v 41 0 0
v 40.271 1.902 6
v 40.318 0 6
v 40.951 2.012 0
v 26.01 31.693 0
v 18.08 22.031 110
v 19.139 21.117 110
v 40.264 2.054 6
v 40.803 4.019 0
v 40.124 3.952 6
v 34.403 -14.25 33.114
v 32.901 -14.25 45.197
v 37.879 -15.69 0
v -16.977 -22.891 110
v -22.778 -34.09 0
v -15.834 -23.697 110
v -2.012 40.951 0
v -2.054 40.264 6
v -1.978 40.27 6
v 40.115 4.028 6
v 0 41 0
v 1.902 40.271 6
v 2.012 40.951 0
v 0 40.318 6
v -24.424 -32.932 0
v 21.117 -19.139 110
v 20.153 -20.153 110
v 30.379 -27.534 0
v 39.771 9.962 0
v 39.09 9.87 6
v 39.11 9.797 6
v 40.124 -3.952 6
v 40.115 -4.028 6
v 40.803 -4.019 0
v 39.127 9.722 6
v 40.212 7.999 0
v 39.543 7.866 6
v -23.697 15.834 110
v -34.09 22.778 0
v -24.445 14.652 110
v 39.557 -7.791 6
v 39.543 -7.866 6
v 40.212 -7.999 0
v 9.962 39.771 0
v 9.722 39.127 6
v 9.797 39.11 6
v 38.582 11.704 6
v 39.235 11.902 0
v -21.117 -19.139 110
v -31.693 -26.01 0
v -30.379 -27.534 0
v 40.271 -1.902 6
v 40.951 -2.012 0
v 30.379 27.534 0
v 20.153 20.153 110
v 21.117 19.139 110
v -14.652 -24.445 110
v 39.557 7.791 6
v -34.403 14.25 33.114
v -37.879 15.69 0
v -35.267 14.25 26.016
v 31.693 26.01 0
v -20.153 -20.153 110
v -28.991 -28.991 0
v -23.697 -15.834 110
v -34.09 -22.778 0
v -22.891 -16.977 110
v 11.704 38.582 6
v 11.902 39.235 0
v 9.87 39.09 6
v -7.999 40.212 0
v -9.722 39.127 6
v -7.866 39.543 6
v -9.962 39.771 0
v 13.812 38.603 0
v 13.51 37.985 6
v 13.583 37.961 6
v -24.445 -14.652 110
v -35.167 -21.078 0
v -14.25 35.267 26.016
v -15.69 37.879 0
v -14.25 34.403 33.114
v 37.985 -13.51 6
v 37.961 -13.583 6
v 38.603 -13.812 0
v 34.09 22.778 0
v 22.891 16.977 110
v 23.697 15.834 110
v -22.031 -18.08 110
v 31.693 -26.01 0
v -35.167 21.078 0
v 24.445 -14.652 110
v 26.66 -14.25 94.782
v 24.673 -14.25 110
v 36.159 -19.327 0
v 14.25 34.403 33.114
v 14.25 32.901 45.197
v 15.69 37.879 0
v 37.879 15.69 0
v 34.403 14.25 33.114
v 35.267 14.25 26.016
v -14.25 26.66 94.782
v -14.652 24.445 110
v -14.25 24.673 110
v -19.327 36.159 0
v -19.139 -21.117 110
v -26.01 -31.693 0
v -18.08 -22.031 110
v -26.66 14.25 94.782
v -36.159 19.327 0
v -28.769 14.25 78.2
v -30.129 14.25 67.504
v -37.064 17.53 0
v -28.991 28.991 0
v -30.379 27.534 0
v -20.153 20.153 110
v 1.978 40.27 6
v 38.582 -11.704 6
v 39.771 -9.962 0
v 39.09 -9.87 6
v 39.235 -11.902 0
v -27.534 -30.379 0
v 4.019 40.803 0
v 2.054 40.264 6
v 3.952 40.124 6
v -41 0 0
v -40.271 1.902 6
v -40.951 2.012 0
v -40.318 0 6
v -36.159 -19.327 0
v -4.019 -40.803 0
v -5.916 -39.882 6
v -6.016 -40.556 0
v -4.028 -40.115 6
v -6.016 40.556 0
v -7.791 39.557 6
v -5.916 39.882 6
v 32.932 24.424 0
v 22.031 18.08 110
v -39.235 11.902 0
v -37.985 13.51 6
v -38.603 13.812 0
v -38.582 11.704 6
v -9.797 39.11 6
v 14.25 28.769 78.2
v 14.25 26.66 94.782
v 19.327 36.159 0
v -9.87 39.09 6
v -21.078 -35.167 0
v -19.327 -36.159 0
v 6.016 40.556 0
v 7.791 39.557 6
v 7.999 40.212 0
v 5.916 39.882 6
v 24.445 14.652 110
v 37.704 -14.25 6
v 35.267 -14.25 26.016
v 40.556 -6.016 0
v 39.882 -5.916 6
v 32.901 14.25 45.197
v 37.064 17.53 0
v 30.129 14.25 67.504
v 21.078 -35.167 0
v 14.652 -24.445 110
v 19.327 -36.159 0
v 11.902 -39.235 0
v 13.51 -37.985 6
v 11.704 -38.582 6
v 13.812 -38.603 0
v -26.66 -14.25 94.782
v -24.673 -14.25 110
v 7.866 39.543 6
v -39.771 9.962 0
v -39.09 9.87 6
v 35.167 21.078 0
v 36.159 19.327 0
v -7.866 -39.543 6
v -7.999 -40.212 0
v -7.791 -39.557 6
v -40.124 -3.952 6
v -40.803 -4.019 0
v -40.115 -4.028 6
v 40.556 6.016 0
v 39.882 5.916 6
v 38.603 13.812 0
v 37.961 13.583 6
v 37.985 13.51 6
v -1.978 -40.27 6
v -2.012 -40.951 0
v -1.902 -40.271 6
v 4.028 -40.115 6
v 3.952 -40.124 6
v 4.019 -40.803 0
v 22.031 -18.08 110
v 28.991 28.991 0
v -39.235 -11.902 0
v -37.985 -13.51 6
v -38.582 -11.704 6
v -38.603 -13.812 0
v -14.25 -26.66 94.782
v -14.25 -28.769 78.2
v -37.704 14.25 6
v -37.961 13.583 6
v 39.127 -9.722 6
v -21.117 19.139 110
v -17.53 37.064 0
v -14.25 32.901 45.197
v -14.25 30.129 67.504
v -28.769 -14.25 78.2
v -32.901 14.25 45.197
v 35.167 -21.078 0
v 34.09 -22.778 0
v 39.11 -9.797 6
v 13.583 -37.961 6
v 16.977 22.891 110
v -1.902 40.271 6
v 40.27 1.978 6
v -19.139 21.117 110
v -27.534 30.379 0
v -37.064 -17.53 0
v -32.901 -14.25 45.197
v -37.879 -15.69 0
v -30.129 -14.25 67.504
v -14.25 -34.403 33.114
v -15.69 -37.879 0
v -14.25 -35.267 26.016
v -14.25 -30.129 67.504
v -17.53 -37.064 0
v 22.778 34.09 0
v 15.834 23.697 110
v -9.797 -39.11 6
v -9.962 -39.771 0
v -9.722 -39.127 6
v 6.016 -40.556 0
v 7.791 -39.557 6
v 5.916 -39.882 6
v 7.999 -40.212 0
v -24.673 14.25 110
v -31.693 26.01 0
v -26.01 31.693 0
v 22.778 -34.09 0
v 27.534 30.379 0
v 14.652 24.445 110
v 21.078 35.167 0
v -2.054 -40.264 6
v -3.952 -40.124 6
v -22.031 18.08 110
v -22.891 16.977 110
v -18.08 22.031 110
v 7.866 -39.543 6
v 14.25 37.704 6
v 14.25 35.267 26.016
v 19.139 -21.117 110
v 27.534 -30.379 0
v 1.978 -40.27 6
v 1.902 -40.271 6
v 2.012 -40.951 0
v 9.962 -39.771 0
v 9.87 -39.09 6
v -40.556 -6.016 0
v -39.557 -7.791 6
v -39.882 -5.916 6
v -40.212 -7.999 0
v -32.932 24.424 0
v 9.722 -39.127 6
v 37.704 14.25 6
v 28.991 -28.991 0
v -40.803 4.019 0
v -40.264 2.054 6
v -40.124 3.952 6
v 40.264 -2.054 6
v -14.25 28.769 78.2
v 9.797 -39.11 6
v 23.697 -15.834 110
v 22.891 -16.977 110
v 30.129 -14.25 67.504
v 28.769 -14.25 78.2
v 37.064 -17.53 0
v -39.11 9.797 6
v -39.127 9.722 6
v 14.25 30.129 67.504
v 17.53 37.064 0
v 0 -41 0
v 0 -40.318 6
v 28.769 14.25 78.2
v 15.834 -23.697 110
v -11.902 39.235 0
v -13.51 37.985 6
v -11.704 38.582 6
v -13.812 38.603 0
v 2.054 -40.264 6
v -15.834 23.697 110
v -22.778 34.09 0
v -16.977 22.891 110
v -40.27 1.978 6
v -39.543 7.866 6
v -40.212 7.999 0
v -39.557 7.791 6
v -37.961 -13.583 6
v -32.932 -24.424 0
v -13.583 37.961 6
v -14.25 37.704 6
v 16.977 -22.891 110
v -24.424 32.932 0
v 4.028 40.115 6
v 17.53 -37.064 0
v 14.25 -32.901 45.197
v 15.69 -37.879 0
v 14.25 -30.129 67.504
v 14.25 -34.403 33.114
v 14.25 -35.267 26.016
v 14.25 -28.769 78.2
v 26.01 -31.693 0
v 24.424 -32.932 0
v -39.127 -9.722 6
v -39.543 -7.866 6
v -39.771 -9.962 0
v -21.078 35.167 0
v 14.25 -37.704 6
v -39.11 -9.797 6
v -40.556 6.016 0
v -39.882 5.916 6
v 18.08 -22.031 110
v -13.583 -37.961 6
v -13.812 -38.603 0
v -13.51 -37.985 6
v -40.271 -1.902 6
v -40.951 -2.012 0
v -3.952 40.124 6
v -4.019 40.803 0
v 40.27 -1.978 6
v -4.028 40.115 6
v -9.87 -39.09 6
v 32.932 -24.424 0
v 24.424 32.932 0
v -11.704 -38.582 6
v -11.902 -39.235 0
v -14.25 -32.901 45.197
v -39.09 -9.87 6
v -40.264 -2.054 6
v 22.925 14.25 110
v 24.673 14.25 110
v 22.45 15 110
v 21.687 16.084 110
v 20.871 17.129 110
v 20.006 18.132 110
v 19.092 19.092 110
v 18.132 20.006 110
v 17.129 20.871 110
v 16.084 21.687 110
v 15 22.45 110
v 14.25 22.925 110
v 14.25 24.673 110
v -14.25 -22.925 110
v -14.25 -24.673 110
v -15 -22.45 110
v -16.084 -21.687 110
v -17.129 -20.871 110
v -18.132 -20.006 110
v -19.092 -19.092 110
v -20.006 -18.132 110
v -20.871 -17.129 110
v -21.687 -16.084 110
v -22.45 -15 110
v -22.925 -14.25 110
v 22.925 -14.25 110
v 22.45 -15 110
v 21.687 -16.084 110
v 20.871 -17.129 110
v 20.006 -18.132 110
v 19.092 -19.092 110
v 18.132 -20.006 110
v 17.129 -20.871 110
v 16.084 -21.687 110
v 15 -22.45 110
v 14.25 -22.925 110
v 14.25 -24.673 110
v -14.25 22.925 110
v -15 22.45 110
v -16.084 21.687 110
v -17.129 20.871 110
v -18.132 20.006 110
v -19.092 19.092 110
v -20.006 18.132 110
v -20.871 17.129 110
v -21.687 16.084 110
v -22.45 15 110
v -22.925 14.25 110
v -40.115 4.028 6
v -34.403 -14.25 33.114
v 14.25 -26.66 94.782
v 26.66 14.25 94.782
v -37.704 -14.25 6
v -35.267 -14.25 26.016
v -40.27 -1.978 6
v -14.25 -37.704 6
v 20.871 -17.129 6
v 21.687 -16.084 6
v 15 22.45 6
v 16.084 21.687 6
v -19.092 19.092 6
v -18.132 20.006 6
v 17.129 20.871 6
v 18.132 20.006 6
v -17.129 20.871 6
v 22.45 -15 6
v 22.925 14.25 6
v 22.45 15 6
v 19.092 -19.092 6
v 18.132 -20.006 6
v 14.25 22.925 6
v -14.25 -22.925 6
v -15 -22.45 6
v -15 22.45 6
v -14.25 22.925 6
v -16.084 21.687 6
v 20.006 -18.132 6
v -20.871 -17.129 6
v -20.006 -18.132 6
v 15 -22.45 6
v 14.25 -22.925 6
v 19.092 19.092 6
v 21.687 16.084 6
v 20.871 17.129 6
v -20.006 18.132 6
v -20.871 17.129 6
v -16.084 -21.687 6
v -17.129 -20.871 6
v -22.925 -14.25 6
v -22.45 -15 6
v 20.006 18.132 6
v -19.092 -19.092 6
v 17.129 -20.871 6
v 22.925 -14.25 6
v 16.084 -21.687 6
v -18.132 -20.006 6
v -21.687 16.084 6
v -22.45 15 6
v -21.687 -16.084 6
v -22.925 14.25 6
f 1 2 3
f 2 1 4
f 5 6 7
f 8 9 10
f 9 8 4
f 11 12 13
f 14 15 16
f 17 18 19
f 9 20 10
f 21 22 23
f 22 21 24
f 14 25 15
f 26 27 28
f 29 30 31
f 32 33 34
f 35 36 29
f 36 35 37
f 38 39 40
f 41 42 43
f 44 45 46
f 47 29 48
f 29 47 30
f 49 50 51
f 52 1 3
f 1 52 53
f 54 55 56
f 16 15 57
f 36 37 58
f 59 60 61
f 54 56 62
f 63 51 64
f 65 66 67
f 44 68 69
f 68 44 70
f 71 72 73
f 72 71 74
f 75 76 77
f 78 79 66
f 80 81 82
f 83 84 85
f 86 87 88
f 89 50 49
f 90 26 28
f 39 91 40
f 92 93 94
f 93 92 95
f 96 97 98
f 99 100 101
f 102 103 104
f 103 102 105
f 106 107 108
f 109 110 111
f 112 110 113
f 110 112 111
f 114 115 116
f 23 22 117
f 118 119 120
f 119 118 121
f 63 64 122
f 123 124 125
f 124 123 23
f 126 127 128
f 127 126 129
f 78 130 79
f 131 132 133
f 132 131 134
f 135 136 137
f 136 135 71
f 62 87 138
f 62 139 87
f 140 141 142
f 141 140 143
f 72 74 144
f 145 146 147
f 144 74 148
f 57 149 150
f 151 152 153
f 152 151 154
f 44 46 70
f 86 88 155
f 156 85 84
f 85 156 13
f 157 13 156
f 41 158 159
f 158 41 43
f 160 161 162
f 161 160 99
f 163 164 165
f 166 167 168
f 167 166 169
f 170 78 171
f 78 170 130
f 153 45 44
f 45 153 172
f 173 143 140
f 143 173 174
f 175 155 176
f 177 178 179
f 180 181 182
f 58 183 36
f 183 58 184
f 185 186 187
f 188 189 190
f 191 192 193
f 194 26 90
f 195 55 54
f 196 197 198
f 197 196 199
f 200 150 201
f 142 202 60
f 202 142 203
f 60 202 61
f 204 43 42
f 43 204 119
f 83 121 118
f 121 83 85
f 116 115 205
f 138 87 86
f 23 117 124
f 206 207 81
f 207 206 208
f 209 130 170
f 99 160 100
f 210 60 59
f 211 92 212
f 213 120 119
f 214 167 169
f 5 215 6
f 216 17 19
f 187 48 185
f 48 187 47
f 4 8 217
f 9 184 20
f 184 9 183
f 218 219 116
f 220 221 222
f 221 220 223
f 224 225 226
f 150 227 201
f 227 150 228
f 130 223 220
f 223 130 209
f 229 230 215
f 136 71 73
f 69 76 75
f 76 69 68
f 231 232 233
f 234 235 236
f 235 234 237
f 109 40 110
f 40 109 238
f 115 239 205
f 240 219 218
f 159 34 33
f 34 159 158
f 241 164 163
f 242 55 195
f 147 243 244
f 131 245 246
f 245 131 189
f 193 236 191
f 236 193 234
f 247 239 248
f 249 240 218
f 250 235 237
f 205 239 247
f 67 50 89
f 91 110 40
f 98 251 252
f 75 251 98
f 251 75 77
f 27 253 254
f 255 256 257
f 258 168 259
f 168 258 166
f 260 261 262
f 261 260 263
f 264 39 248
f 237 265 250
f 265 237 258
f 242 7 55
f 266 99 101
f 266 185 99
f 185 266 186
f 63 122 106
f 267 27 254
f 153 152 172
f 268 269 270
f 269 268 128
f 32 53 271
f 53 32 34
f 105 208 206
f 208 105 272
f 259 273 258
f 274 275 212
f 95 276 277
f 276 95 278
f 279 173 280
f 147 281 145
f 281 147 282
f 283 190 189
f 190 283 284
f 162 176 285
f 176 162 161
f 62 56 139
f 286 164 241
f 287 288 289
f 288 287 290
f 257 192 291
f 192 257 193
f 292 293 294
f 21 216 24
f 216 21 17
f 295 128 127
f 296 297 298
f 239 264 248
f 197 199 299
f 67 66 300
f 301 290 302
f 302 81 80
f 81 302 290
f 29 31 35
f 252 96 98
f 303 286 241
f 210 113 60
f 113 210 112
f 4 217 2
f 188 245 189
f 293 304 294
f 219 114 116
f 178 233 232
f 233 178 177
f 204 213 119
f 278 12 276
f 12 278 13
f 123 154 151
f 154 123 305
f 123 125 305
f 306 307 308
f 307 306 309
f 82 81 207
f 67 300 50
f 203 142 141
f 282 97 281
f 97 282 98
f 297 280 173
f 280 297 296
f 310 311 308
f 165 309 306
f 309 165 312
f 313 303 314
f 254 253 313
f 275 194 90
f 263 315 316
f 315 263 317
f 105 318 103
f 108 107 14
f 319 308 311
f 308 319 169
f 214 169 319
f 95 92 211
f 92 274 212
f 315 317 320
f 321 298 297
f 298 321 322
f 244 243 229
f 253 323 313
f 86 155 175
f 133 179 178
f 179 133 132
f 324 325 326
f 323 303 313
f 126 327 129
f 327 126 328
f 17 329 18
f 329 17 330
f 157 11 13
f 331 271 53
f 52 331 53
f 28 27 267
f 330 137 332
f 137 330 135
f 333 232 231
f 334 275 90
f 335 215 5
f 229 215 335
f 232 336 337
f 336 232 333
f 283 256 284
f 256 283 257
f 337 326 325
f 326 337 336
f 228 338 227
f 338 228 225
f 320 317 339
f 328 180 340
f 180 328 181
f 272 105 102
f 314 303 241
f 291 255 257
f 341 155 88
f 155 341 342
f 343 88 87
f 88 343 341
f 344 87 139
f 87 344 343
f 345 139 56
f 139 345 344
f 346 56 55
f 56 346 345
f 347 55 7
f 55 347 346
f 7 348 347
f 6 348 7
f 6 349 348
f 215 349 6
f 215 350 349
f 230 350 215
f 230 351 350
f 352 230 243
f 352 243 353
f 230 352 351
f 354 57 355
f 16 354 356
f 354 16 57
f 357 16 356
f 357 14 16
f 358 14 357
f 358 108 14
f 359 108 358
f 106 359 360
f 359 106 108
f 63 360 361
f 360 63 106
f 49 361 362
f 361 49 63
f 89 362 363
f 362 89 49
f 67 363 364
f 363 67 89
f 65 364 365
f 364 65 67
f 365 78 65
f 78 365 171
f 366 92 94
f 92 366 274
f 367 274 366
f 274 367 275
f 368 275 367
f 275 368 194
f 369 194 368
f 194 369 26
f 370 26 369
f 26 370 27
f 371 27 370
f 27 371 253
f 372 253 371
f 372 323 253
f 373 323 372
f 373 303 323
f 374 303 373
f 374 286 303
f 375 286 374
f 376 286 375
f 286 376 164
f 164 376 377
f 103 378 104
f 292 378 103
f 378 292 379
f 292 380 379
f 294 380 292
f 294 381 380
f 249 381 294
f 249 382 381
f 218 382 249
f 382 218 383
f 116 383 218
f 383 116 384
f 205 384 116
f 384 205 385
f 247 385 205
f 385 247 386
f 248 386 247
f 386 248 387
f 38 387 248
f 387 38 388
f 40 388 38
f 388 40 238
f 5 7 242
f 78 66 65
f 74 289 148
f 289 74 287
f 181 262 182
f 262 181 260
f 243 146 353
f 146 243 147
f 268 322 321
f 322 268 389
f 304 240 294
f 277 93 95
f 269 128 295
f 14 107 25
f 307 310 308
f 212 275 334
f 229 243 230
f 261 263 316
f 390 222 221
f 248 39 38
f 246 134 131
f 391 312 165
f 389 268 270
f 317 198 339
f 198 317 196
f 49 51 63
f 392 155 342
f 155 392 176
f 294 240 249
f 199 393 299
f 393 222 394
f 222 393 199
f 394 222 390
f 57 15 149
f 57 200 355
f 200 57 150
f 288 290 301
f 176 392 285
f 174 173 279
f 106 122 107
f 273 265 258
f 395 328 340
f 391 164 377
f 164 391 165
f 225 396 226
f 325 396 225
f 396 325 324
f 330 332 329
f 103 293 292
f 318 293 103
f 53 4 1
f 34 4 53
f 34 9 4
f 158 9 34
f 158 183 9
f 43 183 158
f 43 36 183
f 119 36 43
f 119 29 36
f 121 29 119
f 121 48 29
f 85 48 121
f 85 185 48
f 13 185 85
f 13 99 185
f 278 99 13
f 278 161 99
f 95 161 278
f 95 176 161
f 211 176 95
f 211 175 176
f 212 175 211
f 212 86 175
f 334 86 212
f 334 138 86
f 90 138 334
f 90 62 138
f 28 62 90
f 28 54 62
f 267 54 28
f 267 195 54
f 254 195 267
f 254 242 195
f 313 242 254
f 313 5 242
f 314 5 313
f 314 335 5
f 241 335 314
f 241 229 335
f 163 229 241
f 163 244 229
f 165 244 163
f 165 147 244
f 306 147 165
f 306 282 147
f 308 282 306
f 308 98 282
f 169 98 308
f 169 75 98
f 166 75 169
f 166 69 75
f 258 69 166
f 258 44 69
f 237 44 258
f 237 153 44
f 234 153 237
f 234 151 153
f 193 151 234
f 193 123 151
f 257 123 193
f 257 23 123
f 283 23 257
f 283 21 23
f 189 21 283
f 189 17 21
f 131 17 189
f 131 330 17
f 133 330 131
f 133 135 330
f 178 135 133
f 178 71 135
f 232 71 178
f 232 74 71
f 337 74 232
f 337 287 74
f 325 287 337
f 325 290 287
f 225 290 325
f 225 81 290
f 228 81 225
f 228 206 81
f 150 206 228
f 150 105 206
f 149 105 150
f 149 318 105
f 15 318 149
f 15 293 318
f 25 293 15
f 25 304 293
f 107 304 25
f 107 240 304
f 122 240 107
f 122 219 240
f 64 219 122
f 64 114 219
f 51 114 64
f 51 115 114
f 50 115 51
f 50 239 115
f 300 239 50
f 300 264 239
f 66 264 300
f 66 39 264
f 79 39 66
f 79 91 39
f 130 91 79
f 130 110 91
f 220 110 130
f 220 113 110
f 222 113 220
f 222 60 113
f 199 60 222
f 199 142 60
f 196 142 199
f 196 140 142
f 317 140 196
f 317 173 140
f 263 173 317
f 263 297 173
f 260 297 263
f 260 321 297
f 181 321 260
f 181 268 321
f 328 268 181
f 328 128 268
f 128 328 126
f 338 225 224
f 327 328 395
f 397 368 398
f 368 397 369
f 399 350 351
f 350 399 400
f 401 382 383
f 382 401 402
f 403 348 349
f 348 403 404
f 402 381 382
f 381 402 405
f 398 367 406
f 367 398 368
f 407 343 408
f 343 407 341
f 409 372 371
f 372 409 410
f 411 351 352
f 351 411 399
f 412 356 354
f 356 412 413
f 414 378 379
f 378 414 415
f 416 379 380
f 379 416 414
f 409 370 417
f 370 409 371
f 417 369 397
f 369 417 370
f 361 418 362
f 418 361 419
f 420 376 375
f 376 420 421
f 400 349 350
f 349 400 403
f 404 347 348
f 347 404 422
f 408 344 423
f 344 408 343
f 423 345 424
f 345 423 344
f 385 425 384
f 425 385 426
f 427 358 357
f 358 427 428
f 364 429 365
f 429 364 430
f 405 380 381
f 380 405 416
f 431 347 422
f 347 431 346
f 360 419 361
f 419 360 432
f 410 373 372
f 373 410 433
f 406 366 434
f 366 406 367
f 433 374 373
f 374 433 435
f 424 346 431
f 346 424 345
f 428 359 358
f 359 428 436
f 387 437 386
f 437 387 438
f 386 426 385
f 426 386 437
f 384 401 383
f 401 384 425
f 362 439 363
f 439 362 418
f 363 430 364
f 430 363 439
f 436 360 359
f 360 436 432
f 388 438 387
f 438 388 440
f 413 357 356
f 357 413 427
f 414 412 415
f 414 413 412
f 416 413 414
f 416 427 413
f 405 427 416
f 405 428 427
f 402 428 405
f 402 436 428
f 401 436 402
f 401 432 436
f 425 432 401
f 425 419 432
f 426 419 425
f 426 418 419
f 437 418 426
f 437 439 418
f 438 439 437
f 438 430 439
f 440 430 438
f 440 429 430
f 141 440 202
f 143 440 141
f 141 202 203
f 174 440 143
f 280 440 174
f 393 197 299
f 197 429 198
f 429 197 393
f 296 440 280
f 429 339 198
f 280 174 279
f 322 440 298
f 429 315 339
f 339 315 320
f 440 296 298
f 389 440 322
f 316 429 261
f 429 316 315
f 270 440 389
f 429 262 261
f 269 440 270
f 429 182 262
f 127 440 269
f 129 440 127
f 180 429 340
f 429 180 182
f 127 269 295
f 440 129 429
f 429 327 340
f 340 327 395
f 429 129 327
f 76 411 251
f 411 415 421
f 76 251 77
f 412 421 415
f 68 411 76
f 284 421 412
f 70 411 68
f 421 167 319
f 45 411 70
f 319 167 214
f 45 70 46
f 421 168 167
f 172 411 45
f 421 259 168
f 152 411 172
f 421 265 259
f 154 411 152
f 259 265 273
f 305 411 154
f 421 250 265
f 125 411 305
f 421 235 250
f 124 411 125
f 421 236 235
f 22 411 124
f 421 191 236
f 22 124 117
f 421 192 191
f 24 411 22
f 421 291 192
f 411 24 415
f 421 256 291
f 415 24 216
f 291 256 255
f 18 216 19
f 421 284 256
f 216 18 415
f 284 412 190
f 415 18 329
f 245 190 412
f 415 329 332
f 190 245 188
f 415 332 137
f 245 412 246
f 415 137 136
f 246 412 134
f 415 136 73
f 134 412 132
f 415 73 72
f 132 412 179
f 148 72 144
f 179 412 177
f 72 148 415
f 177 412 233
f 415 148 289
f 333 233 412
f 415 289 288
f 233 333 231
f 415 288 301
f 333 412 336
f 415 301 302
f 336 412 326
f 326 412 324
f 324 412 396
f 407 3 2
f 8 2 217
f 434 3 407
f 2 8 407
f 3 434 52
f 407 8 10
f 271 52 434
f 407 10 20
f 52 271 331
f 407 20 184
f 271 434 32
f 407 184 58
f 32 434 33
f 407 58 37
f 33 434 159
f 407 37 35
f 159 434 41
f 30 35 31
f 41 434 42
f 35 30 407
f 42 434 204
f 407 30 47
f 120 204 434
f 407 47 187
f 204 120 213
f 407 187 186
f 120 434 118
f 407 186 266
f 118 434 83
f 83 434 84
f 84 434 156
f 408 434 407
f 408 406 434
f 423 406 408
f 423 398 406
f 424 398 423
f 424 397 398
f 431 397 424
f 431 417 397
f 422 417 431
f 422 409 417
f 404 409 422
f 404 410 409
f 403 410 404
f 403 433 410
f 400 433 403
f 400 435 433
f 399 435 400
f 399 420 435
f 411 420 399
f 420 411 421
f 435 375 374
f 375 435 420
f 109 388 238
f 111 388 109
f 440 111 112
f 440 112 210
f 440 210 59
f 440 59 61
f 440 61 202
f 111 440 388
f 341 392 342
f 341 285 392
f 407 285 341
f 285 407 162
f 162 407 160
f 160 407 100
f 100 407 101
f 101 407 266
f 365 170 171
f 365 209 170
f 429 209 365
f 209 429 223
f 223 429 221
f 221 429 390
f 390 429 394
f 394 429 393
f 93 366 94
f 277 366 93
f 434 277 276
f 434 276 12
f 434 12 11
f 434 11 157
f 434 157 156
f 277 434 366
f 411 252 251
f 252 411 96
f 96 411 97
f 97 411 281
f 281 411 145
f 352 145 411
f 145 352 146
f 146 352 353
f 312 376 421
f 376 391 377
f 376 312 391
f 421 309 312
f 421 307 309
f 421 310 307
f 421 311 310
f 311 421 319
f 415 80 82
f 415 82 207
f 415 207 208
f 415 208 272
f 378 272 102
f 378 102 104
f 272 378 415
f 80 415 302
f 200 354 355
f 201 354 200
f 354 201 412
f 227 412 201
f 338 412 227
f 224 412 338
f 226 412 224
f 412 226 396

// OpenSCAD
$fn=128;

// Jumbo = 130
// Mini = 110
// Overall height, including base
height = 110;

// Jumbo = 75
// Mini = 54
// Inner diameter -- make this bigger than the product to be held
innerDiameter = 54;

// Thickness of the tines at the top
minimumThickness = 1.5;

// Thickness of the tines at the bottom
maximumThickness = 14;

// Thickness (top to bottom) of the base
baseThickness = minimumThickness * 4;

// Calculated diameters for the cylinder() function
topDiam = innerDiameter + minimumThickness * 2;
bottomDiam = innerDiameter + maximumThickness * 2;

difference() {
    cylinder(d1=bottomDiam, d2=topDiam, h=height);
    translate([0,0,baseThickness])
        cylinder(d=innerDiameter, h=height);
    translate([0,0,baseThickness+height/2])
        cube([bottomDiam*2, topDiam/2, height], center=true);
    translate([0,0,baseThickness+height/2])
        cube([topDiam/2, bottomDiam*2, height], center=true);
}
